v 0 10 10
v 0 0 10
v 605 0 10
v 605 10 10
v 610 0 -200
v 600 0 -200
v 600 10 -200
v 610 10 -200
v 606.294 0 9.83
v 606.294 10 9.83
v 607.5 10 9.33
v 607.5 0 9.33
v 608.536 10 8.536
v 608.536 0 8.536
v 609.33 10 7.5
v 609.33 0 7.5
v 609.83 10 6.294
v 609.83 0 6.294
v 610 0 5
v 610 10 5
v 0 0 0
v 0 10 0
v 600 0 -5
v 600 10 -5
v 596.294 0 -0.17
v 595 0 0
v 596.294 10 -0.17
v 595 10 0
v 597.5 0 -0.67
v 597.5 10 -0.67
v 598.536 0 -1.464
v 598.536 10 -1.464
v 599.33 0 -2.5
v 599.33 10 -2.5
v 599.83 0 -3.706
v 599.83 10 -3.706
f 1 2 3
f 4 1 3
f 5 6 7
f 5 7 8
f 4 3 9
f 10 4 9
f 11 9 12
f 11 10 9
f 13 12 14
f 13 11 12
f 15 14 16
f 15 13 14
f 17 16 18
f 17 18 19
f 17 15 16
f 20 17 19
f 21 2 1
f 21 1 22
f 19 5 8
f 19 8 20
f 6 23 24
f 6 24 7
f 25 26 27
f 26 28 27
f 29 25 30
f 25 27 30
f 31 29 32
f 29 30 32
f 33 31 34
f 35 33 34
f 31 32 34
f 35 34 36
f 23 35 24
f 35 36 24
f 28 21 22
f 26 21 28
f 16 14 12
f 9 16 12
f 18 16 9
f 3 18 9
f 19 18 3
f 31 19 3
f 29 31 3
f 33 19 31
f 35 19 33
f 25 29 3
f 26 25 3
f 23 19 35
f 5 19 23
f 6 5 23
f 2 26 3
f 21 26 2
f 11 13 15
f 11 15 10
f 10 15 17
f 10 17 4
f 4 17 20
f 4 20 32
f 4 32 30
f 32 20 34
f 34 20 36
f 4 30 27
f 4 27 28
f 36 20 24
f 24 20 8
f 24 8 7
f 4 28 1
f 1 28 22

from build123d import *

# Parameters (mm, degrees)
EXTRUDE_1_DEPTH = 10
FILLET_1_R      = 5
FILLET_2_R      = 5


with BuildPart() as part:
    # 草图1 → 凸台-拉伸1 (new body)
    with BuildSketch(Plane(origin=(0, 0, 0), x_dir=(1, 0, 0), z_dir=(0, 1, 0))):
        Polygon((0, 0), (600, 0), (600, 200), (610, 200), (610, -10), (600, -10), (0, -10), align=None)
    extrude(amount=EXTRUDE_1_DEPTH)

    # 圆角1
    fillet_1_edges = [part.edges().sort_by_distance(p)[0] for p in [
        (600, 5, 0),
    ]]
    fillet(fillet_1_edges, radius=FILLET_1_R)

    # 圆角2
    fillet_2_edges = [part.edges().sort_by_distance(p)[0] for p in [
        (610, 5, 10),
    ]]
    fillet(fillet_2_edges, radius=FILLET_2_R)


solid = part.part
